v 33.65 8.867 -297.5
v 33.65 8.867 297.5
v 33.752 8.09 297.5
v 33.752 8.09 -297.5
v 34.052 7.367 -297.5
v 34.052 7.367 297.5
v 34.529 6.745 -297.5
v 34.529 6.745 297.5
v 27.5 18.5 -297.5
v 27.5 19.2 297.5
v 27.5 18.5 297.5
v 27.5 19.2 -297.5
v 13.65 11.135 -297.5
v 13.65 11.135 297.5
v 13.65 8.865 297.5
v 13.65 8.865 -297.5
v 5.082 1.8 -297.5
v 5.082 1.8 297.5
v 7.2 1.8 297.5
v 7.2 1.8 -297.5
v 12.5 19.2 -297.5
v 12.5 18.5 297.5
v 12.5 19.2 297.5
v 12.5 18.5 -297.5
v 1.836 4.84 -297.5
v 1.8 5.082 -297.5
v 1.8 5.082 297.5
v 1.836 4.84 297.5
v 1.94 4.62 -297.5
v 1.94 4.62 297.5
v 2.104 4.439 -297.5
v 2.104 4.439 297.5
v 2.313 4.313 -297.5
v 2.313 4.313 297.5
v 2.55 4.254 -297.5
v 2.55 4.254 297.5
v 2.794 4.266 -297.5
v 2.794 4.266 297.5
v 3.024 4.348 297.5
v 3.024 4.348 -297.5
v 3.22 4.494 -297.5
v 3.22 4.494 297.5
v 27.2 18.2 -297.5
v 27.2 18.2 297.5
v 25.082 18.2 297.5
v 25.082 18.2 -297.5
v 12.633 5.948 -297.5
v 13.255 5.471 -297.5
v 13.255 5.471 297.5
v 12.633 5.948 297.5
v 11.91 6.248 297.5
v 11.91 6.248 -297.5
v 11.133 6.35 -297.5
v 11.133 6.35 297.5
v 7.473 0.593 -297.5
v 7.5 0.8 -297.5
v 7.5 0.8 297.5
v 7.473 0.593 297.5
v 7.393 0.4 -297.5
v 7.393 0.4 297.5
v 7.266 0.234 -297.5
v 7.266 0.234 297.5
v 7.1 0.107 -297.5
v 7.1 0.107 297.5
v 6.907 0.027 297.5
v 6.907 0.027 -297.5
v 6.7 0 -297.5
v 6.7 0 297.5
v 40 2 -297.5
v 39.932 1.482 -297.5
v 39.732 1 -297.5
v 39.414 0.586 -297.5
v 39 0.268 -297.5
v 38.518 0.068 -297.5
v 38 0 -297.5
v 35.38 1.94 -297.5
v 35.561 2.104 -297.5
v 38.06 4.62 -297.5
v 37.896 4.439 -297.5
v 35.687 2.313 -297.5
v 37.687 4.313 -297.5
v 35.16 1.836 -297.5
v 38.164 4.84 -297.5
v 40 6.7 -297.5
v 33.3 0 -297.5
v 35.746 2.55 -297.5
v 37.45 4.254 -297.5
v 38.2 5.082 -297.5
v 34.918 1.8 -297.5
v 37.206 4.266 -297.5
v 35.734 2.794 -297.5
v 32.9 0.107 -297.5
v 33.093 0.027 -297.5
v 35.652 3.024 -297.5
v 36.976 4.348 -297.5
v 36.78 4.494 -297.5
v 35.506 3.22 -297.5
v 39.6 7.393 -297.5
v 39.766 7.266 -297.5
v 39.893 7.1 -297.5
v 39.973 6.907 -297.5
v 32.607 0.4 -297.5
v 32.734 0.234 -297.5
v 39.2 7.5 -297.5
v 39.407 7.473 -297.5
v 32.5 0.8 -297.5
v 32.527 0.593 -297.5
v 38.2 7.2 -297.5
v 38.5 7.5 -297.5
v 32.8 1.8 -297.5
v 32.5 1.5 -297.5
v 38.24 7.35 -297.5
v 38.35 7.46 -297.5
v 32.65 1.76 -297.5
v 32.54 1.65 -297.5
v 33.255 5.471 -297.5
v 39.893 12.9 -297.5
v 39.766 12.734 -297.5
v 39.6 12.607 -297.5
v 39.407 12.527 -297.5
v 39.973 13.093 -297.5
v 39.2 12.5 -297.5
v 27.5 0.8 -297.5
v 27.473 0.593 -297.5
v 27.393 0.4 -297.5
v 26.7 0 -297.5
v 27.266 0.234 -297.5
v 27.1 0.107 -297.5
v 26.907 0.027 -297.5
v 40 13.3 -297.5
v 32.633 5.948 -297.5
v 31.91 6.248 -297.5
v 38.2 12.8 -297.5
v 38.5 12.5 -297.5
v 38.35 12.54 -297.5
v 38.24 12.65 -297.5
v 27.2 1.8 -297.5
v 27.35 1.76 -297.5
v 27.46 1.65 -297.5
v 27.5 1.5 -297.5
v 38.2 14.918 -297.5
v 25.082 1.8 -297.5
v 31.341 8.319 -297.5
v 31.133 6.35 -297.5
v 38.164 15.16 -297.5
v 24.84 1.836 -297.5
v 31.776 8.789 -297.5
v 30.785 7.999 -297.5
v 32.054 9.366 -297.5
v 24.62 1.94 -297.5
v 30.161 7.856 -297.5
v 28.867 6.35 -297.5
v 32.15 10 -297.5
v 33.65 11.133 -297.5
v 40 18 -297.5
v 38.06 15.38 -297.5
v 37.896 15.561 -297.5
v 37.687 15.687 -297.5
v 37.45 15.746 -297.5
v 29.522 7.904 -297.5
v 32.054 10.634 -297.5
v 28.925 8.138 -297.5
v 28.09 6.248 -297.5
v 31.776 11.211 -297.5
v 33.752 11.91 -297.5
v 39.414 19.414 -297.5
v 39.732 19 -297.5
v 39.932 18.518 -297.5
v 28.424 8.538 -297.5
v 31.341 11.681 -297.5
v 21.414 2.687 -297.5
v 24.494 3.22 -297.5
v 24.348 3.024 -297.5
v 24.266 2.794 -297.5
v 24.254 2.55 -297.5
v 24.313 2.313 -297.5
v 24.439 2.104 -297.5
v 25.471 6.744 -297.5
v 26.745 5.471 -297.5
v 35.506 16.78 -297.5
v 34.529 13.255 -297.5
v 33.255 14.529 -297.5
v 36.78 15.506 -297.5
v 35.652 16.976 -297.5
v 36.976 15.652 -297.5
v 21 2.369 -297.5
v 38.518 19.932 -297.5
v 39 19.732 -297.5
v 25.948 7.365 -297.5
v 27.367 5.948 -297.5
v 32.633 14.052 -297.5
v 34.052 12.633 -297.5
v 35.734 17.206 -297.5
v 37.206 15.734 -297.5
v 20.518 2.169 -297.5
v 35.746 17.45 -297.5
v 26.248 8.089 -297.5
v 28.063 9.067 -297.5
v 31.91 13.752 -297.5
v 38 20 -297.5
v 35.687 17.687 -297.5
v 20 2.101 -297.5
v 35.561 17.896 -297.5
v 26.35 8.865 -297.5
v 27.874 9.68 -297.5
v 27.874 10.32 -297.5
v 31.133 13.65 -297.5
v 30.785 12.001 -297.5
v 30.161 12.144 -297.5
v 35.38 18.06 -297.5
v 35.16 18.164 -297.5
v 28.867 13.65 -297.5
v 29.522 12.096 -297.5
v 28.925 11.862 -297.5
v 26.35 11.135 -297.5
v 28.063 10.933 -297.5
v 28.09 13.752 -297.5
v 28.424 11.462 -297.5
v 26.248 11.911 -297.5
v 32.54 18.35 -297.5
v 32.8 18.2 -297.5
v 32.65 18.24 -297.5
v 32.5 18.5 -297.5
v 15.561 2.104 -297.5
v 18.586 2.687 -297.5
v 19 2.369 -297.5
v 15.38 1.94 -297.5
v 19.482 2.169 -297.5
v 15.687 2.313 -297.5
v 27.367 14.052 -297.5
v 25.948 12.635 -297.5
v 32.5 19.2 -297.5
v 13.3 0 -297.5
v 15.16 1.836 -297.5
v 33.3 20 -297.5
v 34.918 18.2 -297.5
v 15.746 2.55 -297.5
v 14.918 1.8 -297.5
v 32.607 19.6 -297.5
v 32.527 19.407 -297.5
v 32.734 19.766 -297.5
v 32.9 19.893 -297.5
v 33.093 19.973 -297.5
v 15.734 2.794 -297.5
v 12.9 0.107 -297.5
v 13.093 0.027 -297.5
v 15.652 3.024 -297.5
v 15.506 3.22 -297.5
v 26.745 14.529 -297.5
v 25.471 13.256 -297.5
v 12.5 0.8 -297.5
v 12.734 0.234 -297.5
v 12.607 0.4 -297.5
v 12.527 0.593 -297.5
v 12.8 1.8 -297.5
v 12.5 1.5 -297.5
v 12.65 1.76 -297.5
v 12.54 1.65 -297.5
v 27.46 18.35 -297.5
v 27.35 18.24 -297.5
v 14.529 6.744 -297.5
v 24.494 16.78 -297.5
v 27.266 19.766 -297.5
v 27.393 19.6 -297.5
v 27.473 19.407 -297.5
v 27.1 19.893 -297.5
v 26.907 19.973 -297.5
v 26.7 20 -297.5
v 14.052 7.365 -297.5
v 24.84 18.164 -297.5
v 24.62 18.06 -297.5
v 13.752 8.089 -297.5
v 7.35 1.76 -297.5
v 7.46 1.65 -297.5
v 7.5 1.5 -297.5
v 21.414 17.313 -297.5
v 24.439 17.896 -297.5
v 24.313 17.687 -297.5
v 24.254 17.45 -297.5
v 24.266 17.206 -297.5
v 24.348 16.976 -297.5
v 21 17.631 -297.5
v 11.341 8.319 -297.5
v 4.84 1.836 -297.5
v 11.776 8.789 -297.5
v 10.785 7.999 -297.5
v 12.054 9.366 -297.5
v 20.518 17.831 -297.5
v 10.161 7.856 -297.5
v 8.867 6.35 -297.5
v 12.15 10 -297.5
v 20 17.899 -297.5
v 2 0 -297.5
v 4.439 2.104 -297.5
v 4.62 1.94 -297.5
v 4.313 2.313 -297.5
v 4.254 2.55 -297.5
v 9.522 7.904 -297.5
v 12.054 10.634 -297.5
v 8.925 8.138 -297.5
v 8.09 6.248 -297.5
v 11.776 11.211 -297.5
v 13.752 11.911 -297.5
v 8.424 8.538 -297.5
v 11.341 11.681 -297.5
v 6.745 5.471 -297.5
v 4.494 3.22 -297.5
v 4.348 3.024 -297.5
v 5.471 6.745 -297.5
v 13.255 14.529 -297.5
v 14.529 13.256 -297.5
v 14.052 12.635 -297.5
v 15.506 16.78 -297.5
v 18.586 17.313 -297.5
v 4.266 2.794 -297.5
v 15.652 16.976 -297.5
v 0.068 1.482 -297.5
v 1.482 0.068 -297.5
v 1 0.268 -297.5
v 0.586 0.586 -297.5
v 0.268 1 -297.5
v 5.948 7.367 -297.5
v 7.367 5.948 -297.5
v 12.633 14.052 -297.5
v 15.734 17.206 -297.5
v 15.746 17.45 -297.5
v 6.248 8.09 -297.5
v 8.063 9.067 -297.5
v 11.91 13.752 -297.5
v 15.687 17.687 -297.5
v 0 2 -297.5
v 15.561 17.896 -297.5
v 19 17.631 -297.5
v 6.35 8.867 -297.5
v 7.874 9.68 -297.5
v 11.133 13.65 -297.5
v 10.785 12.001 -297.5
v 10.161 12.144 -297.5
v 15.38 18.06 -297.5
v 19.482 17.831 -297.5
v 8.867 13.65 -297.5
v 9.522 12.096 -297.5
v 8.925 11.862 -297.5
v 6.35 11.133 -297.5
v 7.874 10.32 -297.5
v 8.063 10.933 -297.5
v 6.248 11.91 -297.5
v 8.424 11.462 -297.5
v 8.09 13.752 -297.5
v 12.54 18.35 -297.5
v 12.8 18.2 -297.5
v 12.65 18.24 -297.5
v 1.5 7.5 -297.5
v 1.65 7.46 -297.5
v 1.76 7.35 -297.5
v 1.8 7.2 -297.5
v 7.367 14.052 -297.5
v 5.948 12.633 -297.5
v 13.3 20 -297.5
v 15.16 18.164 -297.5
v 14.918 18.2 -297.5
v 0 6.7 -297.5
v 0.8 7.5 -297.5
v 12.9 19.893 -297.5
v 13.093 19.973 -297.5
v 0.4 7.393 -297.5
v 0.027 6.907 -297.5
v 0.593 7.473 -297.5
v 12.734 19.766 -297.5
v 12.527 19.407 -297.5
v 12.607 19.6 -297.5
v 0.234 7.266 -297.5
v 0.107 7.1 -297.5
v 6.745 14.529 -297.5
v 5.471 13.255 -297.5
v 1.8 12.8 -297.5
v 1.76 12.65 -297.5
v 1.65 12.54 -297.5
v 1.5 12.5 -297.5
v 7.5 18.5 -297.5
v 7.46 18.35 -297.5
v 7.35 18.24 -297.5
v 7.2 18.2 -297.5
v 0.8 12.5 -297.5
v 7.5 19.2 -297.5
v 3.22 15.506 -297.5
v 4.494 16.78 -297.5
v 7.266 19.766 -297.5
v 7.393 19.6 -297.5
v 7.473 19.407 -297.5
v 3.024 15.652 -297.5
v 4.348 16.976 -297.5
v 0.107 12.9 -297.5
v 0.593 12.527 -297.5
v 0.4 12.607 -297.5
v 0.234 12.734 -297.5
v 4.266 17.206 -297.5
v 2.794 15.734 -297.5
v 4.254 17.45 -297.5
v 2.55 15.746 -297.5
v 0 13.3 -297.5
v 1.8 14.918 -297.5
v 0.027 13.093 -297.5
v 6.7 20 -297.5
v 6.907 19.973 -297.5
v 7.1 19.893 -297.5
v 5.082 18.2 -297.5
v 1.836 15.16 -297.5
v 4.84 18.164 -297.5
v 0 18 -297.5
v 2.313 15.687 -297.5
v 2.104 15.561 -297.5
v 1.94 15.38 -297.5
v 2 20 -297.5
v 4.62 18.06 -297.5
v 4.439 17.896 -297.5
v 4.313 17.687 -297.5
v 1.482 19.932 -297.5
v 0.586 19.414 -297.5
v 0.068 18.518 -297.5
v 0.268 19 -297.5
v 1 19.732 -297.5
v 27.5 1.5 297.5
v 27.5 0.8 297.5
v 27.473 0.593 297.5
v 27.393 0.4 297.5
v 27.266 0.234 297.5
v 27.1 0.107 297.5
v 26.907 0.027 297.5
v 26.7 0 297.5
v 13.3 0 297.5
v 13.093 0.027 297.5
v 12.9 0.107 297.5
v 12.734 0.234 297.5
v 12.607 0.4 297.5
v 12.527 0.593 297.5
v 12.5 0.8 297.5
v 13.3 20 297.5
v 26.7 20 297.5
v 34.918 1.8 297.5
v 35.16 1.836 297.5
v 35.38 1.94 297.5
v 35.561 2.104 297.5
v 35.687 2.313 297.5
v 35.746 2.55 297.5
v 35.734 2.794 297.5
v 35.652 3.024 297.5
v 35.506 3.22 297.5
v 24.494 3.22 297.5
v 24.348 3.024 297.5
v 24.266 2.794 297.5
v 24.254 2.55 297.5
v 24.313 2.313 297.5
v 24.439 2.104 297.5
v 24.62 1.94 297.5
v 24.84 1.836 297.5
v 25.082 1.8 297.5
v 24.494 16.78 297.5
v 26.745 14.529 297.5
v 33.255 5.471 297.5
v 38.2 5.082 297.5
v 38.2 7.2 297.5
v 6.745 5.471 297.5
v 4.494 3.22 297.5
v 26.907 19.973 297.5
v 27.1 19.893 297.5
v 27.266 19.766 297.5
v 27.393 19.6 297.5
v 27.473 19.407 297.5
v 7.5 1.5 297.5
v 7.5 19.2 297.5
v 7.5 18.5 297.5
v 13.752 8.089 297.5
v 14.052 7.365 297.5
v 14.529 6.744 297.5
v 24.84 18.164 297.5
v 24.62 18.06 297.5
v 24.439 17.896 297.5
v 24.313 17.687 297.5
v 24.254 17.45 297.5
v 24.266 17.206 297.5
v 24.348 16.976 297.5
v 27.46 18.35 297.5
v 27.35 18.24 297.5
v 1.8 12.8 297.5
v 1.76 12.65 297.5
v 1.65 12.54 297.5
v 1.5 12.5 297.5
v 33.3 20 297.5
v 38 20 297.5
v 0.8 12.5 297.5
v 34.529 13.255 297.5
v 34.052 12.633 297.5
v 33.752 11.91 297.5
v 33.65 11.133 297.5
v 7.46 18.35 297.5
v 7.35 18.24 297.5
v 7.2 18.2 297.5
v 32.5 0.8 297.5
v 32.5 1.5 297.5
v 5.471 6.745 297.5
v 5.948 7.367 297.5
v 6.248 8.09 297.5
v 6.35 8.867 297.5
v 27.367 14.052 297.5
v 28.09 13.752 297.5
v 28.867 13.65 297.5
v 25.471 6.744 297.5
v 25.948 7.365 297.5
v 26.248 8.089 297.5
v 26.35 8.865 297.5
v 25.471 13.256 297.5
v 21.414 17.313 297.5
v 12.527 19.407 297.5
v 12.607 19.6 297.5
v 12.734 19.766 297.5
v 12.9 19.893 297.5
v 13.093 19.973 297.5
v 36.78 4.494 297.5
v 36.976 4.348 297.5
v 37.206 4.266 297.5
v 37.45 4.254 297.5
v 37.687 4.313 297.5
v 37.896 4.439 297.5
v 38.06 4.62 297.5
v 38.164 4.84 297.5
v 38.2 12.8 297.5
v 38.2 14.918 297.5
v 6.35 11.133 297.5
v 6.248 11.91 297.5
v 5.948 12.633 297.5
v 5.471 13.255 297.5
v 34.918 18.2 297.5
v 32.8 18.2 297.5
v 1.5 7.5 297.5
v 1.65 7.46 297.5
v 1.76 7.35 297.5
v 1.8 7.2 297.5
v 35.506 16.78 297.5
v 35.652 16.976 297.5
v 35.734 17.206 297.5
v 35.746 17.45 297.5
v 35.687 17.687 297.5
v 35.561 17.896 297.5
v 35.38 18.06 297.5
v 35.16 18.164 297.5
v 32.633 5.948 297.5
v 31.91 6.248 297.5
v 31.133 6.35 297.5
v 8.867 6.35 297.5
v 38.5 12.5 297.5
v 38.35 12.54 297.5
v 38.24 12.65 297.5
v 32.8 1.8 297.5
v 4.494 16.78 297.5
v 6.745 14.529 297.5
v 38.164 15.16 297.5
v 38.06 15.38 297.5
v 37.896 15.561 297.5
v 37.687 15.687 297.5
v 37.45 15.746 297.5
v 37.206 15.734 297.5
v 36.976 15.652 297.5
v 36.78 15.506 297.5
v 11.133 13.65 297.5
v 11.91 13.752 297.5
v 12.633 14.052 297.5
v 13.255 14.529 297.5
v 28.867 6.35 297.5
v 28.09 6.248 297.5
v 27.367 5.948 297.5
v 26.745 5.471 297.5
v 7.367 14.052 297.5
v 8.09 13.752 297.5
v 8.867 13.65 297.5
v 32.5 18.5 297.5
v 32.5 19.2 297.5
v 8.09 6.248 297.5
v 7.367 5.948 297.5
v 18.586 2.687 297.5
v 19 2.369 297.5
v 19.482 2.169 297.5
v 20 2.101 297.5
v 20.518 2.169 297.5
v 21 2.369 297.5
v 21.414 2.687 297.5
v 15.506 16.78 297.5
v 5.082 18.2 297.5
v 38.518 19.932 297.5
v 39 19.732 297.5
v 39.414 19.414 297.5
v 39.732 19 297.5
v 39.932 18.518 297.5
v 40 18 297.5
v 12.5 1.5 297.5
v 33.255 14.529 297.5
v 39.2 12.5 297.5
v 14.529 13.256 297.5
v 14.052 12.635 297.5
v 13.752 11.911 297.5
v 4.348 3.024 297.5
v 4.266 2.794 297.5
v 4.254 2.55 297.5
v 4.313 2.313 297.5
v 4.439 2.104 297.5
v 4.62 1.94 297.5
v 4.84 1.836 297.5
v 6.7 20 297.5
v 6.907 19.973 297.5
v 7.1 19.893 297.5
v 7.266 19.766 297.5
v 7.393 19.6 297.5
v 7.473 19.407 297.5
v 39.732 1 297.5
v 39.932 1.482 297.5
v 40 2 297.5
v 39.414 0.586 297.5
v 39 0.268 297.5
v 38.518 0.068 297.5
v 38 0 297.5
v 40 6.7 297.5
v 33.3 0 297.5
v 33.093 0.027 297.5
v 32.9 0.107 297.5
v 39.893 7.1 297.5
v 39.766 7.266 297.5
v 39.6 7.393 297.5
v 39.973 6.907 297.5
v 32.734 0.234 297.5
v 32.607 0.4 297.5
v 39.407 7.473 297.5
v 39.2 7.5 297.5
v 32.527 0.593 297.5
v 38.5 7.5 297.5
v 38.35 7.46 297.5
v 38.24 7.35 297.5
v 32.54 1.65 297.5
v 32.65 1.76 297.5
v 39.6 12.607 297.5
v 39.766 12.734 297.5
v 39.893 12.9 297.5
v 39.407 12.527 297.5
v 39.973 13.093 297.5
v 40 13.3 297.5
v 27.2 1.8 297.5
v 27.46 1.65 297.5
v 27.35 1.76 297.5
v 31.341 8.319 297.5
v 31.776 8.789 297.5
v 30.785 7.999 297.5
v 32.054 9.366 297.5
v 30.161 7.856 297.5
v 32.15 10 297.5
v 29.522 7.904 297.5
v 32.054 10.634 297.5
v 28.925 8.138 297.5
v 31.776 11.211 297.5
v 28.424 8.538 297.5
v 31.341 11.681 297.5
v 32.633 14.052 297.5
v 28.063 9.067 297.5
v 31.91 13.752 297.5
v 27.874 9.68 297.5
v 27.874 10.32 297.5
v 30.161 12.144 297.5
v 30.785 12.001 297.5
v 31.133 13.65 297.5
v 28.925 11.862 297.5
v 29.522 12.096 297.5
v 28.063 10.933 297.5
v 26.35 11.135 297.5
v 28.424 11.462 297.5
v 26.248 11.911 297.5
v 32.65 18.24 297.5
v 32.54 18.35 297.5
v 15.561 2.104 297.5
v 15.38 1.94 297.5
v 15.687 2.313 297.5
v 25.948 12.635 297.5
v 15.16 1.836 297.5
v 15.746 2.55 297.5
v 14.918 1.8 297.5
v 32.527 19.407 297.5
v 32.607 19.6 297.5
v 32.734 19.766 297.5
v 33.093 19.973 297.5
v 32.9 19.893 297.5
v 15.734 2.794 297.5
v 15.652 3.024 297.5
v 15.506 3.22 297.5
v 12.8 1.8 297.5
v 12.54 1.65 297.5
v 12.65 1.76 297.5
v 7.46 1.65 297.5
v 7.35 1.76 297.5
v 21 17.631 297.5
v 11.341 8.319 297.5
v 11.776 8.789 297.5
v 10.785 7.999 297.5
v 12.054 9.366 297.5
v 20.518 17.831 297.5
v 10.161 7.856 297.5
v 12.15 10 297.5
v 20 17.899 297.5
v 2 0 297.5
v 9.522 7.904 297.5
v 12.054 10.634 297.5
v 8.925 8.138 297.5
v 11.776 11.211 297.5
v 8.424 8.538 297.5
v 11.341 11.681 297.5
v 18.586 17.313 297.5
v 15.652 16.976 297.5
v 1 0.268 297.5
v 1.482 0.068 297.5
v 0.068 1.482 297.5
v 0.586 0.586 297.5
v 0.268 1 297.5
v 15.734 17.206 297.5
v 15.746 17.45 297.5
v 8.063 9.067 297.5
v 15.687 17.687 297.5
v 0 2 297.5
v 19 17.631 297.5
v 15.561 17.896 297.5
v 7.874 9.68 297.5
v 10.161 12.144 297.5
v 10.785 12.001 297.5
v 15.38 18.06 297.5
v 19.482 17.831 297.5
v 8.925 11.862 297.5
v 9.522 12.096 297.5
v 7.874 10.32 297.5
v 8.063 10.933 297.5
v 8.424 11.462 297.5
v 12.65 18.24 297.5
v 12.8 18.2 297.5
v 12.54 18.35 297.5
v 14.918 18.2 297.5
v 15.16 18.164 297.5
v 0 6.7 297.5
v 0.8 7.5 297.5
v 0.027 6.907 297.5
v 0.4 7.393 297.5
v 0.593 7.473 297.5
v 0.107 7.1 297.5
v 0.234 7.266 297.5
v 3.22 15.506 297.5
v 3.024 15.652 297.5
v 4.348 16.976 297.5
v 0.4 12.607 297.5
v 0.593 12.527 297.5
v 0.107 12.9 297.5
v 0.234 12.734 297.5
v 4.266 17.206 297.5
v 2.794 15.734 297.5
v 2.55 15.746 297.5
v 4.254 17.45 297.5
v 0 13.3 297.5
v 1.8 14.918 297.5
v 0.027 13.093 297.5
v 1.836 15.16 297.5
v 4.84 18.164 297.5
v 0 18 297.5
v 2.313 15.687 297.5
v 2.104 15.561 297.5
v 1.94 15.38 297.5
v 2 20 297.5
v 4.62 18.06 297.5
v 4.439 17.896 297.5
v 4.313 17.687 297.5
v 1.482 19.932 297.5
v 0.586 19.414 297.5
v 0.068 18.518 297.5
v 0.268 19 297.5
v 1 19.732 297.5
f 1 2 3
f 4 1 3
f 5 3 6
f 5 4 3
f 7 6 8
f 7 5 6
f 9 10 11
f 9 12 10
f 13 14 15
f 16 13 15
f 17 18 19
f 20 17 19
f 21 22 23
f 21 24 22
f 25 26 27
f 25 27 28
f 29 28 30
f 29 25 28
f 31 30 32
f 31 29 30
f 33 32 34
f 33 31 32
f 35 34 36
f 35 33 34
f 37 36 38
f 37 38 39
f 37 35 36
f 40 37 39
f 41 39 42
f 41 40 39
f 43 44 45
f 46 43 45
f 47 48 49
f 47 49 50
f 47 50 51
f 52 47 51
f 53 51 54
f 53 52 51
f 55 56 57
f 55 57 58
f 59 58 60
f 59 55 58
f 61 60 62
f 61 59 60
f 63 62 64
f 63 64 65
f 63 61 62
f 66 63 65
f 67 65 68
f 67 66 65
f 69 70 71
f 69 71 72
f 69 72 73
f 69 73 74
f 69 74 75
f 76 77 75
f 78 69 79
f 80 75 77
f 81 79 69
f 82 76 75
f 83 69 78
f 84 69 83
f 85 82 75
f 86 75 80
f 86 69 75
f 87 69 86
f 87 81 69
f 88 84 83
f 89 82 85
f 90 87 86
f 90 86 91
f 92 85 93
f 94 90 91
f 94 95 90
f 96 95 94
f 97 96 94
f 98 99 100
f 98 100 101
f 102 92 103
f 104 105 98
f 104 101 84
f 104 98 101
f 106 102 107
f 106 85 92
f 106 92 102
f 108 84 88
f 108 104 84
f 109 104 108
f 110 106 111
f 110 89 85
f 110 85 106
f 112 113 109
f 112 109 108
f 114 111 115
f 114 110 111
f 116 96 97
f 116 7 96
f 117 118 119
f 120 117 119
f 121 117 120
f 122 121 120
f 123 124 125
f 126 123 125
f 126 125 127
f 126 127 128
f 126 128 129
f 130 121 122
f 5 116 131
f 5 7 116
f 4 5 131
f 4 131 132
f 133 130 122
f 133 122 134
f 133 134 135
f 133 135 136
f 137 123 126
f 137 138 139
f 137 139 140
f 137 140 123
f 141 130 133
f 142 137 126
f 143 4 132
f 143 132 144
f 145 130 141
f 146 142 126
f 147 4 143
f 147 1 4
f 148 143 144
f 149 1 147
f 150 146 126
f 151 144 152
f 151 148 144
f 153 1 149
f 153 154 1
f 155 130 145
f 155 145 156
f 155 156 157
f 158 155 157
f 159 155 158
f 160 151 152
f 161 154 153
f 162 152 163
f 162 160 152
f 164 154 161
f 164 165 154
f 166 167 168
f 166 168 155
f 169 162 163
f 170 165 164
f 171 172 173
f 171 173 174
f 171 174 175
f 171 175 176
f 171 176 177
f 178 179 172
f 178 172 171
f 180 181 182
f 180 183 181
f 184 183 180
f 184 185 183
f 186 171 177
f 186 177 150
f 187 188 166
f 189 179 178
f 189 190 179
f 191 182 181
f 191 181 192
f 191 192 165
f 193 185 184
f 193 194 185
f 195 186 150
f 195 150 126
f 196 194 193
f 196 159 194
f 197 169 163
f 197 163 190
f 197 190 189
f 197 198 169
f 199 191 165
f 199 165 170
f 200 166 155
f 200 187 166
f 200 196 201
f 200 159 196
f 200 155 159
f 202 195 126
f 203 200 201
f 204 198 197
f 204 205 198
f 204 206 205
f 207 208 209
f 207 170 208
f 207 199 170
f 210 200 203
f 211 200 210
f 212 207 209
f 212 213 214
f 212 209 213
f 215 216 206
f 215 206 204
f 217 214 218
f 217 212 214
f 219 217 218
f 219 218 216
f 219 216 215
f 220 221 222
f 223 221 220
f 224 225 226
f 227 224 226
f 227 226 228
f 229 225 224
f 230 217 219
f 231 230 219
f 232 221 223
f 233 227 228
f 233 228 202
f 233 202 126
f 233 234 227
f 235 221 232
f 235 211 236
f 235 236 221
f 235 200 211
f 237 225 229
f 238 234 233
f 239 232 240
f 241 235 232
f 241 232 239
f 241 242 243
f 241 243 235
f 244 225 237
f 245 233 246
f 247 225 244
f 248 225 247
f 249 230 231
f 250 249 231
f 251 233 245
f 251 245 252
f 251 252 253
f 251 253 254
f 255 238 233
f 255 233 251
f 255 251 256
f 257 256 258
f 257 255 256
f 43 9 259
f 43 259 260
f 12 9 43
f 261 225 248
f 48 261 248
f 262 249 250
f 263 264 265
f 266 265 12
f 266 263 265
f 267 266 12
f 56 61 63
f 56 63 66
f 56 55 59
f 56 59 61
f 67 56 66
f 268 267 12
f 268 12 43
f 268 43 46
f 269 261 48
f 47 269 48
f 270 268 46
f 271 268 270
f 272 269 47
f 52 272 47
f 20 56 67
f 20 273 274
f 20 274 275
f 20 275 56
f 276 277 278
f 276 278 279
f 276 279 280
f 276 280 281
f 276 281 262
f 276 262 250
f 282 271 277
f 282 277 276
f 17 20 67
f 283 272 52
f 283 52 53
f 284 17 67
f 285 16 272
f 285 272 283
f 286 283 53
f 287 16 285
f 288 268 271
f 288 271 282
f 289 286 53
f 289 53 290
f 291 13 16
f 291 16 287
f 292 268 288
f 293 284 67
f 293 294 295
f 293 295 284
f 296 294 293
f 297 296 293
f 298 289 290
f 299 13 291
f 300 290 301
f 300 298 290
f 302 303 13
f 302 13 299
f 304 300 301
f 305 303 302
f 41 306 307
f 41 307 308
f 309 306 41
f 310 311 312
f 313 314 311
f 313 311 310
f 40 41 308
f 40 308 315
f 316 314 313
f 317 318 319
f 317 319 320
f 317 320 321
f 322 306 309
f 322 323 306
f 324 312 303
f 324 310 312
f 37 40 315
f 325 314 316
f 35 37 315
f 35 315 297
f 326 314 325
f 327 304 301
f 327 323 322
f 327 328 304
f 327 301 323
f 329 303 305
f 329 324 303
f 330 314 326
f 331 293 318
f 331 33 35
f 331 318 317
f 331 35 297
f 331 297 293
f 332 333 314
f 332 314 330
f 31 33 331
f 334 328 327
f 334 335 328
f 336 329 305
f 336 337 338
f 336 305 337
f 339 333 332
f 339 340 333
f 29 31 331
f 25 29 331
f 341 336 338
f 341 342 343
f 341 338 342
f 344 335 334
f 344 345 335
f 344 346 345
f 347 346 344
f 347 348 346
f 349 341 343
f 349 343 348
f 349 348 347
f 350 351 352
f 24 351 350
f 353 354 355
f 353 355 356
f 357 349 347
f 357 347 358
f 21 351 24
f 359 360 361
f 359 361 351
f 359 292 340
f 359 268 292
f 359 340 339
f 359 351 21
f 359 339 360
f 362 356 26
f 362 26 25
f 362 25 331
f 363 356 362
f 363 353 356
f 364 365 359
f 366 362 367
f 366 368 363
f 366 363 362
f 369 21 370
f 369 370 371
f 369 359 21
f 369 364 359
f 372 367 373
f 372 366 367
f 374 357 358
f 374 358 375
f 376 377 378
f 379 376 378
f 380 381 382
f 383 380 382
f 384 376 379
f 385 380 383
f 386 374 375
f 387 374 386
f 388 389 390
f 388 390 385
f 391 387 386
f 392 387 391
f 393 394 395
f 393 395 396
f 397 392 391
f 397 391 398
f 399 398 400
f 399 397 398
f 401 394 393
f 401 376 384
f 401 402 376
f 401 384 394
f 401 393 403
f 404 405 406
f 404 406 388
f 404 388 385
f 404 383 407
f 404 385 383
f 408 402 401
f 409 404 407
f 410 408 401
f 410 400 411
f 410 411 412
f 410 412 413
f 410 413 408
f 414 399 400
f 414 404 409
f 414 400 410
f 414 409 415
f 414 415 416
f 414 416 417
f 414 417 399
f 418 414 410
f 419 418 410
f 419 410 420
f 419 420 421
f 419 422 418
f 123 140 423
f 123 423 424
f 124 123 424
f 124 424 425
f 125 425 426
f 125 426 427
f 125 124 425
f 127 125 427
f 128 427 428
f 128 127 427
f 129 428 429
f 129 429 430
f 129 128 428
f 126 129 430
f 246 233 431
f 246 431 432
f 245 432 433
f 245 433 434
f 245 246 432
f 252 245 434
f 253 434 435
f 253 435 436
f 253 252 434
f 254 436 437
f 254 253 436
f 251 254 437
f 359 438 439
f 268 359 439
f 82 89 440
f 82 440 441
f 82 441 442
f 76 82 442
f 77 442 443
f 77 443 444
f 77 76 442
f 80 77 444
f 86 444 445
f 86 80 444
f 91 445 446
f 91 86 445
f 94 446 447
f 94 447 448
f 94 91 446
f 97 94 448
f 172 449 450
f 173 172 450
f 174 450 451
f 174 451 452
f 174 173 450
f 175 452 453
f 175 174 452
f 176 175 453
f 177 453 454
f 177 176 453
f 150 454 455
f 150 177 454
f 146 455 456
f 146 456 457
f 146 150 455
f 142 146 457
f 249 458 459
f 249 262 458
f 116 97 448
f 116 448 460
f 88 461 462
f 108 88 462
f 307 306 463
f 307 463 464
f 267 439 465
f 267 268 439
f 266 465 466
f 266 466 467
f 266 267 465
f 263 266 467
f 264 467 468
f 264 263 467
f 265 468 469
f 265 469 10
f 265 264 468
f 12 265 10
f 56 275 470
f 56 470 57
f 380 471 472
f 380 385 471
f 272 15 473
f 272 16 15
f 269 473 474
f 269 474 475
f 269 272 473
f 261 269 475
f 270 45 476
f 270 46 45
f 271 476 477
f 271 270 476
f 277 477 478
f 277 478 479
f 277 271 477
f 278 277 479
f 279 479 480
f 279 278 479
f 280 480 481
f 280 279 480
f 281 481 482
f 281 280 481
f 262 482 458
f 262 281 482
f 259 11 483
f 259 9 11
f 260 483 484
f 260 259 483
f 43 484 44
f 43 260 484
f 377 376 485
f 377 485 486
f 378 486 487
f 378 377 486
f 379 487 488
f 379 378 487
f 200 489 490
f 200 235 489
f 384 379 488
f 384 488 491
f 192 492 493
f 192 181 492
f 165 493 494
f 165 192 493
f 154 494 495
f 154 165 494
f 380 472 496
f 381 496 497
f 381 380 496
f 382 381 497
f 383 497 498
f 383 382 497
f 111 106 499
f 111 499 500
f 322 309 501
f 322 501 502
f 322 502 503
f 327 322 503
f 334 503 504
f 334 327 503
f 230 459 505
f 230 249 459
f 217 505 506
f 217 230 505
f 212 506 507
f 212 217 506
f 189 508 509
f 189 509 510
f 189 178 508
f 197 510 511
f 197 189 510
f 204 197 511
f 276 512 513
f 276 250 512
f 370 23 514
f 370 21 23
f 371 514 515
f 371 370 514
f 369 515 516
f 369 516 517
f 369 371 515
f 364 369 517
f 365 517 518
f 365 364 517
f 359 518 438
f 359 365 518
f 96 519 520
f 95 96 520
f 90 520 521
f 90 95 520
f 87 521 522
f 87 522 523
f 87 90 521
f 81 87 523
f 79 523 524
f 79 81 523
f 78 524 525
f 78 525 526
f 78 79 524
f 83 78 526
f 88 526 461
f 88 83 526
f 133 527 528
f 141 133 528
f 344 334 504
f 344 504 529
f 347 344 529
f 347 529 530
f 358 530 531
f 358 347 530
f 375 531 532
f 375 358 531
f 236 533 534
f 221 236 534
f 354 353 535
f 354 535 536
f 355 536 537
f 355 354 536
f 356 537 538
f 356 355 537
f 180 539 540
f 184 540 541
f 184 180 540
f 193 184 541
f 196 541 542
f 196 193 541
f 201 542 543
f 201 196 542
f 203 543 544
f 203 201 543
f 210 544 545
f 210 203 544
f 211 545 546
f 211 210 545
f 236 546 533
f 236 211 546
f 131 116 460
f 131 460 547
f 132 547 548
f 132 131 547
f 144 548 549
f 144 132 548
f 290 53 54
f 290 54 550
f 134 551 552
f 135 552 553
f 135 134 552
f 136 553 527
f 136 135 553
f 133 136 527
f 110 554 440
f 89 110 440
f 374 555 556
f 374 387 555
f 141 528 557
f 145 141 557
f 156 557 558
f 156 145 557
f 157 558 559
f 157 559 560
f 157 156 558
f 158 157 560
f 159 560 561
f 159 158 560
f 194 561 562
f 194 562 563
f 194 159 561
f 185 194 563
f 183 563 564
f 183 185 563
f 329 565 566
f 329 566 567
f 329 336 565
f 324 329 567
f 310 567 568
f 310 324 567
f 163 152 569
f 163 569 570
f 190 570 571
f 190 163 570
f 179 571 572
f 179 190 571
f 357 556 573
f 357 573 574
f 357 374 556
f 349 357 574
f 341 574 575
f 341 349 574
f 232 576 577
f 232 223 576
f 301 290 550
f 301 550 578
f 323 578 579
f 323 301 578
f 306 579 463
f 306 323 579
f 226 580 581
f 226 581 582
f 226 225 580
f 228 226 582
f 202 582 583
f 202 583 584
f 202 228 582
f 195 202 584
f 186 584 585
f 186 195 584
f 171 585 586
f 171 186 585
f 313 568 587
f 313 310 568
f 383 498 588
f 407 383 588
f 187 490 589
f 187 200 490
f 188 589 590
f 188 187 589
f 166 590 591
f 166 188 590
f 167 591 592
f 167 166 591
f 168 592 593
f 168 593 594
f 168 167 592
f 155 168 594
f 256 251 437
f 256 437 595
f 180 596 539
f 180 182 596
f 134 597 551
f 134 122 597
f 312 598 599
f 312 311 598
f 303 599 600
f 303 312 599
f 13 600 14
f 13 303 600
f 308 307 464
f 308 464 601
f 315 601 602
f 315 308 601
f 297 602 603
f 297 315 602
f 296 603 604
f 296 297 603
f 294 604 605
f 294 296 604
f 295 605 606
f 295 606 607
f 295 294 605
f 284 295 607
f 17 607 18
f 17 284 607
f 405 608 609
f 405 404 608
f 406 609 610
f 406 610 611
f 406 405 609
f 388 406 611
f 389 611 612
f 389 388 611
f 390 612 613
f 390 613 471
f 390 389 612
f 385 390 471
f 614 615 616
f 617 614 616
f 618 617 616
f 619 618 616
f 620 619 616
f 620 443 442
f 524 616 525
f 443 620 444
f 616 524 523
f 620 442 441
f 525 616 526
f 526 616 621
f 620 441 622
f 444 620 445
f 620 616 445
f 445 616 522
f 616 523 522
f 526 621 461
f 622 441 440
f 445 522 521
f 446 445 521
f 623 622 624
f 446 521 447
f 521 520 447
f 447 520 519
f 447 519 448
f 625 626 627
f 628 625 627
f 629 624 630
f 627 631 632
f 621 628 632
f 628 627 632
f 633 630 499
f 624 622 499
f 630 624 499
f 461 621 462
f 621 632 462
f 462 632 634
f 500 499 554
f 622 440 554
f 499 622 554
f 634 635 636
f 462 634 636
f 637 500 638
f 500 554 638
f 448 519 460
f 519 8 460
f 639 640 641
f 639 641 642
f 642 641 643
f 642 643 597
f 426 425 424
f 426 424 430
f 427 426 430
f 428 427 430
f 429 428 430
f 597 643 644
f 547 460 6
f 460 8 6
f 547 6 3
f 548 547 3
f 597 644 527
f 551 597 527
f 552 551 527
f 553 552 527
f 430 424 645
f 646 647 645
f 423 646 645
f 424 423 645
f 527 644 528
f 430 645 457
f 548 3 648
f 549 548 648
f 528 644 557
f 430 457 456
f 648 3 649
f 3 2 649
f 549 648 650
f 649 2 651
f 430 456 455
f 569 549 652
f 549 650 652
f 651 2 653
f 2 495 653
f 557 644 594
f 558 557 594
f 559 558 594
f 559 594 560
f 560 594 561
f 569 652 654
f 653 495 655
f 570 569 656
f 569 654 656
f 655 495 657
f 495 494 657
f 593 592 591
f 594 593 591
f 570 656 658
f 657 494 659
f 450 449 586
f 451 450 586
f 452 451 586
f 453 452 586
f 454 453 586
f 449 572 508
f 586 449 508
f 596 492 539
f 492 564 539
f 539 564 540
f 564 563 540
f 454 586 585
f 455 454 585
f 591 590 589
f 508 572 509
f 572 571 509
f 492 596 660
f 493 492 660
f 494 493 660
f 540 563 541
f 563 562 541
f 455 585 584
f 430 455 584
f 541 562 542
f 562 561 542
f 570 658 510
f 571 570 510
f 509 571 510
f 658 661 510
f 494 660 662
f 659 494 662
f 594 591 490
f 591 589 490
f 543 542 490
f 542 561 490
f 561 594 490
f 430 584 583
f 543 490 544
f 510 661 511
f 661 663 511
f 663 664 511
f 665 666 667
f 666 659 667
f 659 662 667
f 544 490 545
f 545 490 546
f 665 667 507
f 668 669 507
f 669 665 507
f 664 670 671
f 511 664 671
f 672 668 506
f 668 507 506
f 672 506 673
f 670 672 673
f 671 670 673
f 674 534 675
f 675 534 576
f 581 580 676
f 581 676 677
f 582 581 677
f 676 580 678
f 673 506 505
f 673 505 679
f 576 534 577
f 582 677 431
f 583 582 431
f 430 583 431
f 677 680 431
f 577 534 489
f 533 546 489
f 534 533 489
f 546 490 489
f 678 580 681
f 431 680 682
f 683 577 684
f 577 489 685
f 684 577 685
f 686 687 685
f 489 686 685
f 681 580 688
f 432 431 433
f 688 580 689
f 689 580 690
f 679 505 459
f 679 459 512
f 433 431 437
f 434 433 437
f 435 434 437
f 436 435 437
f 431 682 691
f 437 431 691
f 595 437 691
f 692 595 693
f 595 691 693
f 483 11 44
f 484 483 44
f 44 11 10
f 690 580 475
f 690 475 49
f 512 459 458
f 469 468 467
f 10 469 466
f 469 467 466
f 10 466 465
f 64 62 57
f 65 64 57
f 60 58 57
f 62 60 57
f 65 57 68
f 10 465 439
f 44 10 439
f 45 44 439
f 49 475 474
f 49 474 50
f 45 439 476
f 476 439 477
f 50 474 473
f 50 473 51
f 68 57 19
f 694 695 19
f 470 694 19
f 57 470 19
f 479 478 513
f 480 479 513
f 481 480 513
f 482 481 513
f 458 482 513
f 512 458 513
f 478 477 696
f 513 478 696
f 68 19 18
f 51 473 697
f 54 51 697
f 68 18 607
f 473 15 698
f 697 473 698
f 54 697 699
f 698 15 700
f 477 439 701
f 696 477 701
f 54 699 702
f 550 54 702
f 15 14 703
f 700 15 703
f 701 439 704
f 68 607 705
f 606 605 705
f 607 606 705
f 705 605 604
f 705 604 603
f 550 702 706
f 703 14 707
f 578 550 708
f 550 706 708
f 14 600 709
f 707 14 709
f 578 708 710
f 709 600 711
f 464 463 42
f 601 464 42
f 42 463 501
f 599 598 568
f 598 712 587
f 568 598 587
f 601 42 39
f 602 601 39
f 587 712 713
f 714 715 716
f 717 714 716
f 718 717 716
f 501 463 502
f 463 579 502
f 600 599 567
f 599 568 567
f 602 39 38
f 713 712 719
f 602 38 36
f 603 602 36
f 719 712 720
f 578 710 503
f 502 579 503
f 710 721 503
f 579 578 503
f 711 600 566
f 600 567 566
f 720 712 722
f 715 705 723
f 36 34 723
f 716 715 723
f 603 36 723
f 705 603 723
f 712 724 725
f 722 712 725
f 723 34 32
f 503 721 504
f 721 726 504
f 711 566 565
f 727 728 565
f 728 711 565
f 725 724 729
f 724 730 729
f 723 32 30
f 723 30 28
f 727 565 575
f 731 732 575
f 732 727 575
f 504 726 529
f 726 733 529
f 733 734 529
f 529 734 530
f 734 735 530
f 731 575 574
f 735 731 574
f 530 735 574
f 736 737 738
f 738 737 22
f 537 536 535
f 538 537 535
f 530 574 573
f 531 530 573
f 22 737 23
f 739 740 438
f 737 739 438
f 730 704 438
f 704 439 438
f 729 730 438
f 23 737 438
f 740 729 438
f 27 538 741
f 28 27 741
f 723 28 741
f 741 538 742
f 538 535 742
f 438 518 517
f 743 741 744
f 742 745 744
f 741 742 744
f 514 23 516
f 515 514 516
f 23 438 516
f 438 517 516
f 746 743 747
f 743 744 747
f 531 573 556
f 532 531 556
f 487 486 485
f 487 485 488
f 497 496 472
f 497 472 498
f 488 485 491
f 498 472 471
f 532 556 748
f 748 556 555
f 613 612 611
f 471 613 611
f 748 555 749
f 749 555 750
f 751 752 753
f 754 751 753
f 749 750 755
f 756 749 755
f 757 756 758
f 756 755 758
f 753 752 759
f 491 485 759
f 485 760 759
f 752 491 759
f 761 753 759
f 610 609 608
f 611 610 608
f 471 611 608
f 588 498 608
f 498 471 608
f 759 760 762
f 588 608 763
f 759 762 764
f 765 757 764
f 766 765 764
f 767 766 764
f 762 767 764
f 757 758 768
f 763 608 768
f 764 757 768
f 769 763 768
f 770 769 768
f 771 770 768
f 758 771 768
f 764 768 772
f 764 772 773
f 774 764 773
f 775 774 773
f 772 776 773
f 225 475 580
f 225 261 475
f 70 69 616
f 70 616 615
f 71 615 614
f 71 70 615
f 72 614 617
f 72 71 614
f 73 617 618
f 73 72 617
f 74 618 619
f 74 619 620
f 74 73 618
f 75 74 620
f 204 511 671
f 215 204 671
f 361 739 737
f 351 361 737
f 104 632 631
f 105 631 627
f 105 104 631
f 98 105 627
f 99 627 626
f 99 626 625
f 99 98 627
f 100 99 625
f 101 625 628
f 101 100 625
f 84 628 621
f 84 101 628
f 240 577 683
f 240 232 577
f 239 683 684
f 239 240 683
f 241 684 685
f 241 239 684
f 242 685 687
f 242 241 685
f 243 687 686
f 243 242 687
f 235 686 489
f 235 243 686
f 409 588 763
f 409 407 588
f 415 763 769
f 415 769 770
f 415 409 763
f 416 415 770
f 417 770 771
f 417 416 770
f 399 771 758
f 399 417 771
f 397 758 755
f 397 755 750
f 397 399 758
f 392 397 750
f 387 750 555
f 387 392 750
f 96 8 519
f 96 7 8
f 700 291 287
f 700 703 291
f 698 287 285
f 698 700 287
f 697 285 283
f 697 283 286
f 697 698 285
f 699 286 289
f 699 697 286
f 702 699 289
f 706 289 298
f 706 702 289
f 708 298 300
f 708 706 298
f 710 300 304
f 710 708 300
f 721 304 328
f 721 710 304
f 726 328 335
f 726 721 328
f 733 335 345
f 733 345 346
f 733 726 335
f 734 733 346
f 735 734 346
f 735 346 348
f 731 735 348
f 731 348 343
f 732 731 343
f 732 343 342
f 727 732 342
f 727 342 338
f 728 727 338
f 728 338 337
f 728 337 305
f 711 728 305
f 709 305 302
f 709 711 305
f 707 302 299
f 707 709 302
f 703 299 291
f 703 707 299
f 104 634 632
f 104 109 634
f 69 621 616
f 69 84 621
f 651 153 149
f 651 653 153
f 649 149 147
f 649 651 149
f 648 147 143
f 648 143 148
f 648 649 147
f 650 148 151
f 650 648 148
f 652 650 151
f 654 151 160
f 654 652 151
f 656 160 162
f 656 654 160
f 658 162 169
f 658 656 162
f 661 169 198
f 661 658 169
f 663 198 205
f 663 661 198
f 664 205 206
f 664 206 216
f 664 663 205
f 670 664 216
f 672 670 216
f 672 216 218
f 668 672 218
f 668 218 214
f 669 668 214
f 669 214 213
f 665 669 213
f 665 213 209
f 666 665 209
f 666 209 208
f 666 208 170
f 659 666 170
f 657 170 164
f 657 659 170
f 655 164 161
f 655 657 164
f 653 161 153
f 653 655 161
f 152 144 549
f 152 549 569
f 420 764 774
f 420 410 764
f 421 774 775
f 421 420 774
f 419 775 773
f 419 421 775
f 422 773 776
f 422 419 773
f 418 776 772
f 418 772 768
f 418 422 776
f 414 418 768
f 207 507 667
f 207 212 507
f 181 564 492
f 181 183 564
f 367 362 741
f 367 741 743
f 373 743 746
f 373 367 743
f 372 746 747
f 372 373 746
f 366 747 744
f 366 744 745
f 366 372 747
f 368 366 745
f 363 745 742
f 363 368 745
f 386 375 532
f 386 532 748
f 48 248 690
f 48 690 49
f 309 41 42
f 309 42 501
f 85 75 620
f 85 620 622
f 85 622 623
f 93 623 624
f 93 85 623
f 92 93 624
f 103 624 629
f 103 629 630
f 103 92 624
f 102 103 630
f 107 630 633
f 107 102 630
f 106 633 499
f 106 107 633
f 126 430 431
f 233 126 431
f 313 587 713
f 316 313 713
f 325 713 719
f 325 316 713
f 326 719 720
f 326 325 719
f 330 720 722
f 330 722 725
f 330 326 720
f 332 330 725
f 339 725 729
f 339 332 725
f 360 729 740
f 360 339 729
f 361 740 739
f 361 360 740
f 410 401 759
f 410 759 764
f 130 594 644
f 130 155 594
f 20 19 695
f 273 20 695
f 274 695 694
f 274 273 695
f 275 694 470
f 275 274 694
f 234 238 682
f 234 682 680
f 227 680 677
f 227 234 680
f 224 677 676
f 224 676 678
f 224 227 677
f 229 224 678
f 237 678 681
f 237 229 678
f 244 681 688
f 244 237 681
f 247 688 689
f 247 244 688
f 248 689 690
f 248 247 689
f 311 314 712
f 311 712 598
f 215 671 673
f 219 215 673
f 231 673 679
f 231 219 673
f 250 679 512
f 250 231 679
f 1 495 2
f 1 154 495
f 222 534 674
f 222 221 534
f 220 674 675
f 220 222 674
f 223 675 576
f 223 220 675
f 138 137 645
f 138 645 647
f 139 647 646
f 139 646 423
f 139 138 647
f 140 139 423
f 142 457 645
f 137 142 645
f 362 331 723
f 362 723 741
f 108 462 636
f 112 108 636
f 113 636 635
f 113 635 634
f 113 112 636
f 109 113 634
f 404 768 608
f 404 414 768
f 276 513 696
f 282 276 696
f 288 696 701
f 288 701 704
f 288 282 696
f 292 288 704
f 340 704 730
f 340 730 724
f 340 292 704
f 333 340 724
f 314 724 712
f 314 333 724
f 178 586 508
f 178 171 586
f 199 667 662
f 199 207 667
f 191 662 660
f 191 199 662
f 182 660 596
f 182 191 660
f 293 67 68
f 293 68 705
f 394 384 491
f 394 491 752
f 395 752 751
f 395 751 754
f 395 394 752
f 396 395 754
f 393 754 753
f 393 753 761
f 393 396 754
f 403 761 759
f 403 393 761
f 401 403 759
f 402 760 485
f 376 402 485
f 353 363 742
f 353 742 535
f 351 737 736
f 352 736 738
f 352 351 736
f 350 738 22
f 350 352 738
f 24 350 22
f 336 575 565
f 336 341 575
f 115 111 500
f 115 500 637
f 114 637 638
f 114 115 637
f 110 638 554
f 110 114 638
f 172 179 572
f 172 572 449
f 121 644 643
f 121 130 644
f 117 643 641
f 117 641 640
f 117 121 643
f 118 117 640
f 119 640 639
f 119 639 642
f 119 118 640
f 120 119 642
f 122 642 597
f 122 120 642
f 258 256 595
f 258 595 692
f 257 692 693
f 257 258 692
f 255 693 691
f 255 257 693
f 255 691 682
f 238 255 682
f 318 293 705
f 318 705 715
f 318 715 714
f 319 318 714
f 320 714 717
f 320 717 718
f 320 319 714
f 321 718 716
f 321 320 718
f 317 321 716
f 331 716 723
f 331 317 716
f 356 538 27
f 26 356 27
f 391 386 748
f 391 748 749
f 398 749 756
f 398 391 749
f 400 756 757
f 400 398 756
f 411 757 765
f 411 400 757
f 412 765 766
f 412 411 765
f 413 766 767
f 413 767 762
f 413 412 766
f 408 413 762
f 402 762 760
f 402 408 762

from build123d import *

# Parameters (mm, degrees)
ESQUISSE1_R        = 2.15
BOSS_EXTRU_1_DEPTH = 297.5


with BuildPart() as part:
    # Esquisse1 → Boss.-Extru.1 (new, symmetric)
    with BuildSketch(Plane(origin=(0, 0, 0), x_dir=(-1, 0, 0), z_dir=(0, 0, -1))):
        with BuildLine():
            Line((-40, 6.7), (-40, 2))
            ThreePointArc((-40, 2), (-39.414213562, 0.585786438), (-38, 0))
            Line((-38, 0), (-33.3, 0))
            ThreePointArc((-33.3, 0), (-32.734314575, 0.234314575), (-32.5, 0.8))
            Line((-32.5, 0.8), (-32.5, 1.5))
            ThreePointArc((-32.5, 1.5), (-32.587867966, 1.712132034), (-32.8, 1.8))
            Line((-32.8, 1.8), (-34.918424061, 1.8))
            ThreePointArc((-34.918424061, 1.8), (-35.686700051, 2.313345604), (-35.506437047, 3.219588924))
            Line((-35.506437047, 3.219588924), (-33.254705627, 5.471320344))
            ThreePointArc((-33.254705627, 5.471320344), (-32.281435581, 6.121638598), (-31.133385284, 6.35))
            Line((-31.133385284, 6.35), (-28.866614716, 6.35))
            ThreePointArc((-28.866614716, 6.35), (-27.718564419, 6.121638598), (-26.745294373, 5.471320344))
            Line((-26.745294373, 5.471320344), (-24.493562953, 3.219588924))
            ThreePointArc((-24.493562953, 3.219588924), (-24.313299949, 2.313345604), (-25.081575939, 1.8))
            Line((-25.081575939, 1.8), (-27.2, 1.8))
            ThreePointArc((-27.2, 1.8), (-27.412132034, 1.712132034), (-27.5, 1.5))
            Line((-27.5, 1.5), (-27.5, 0.8))
            ThreePointArc((-27.5, 0.8), (-27.265685425, 0.234314575), (-26.7, 0))
            Line((-26.7, 0), (-13.3, 0))
            ThreePointArc((-13.3, 0), (-12.734314575, 0.234314575), (-12.5, 0.8))
            Line((-12.5, 0.8), (-12.5, 1.5))
            ThreePointArc((-12.5, 1.5), (-12.587867966, 1.712132034), (-12.8, 1.8))
            Line((-12.8, 1.8), (-14.918424061, 1.8))
            ThreePointArc((-14.918424061, 1.8), (-15.686700051, 2.313345604), (-15.506437047, 3.219588924))
            Line((-15.506437047, 3.219588924), (-13.254705627, 5.471320344))
            ThreePointArc((-13.254705627, 5.471320344), (-12.281435581, 6.121638598), (-11.133385284, 6.35))
            Line((-11.133385284, 6.35), (-8.866614716, 6.35))
            ThreePointArc((-8.866614716, 6.35), (-7.718564419, 6.121638598), (-6.745294373, 5.471320344))
            Line((-6.745294373, 5.471320344), (-4.493562953, 3.219588924))
            ThreePointArc((-4.493562953, 3.219588924), (-4.313299949, 2.313345604), (-5.081575939, 1.8))
            Line((-5.081575939, 1.8), (-7.2, 1.8))
            ThreePointArc((-7.2, 1.8), (-7.412132034, 1.712132034), (-7.5, 1.5))
            Line((-7.5, 1.5), (-7.5, 0.8))
            ThreePointArc((-7.5, 0.8), (-7.265685425, 0.234314575), (-6.7, 0))
            Line((-6.7, 0), (-2, 0))
            ThreePointArc((-2, 0), (-0.585786438, 0.585786438), (0, 2))
            Line((0, 2), (0, 6.7))
            ThreePointArc((0, 6.7), (-0.234314575, 7.265685425), (-0.8, 7.5))
            Line((-0.8, 7.5), (-1.5, 7.5))
            ThreePointArc((-1.5, 7.5), (-1.712132034, 7.412132034), (-1.8, 7.2))
            Line((-1.8, 7.2), (-1.8, 5.081575939))
            ThreePointArc((-1.8, 5.081575939), (-2.313345604, 4.313299949), (-3.219588924, 4.493562953))
            Line((-3.219588924, 4.493562953), (-5.471320344, 6.745294373))
            ThreePointArc((-5.471320344, 6.745294373), (-6.121638598, 7.718564419), (-6.35, 8.866614716))
            Line((-6.35, 8.866614716), (-6.35, 11.133385284))
            ThreePointArc((-6.35, 11.133385284), (-6.121638598, 12.281435581), (-5.471320344, 13.254705627))
            Line((-5.471320344, 13.254705627), (-3.219588924, 15.506437047))
            ThreePointArc((-3.219588924, 15.506437047), (-2.313345604, 15.686700051), (-1.8, 14.918424061))
            Line((-1.8, 14.918424061), (-1.8, 12.8))
            ThreePointArc((-1.8, 12.8), (-1.712132034, 12.587867966), (-1.5, 12.5))
            Line((-1.5, 12.5), (-0.8, 12.5))
            ThreePointArc((-0.8, 12.5), (-0.234314575, 12.734314575), (0, 13.3))
            Line((0, 13.3), (0, 18))
            ThreePointArc((0, 18), (-0.585786438, 19.414213562), (-2, 20))
            Line((-2, 20), (-6.7, 20))
            ThreePointArc((-6.7, 20), (-7.265685425, 19.765685425), (-7.5, 19.2))
            Line((-7.5, 19.2), (-7.5, 18.5))
            ThreePointArc((-7.5, 18.5), (-7.412132034, 18.287867966), (-7.2, 18.2))
            Line((-7.2, 18.2), (-5.081575939, 18.2))
            ThreePointArc((-5.081575939, 18.2), (-4.313299949, 17.686654396), (-4.493562953, 16.780411076))
            Line((-4.493562953, 16.780411076), (-6.745294373, 14.528679656))
            ThreePointArc((-6.745294373, 14.528679656), (-7.718564419, 13.878361402), (-8.866614716, 13.65))
            Line((-8.866614716, 13.65), (-11.133385284, 13.65))
            ThreePointArc((-11.133385284, 13.65), (-12.281435581, 13.878361402), (-13.254705627, 14.528679656))
            Line((-13.254705627, 14.528679656), (-15.506437047, 16.780411076))
            ThreePointArc((-15.506437047, 16.780411076), (-15.686700051, 17.686654396), (-14.918424061, 18.2))
            Line((-14.918424061, 18.2), (-12.8, 18.2))
            ThreePointArc((-12.8, 18.2), (-12.587867966, 18.287867966), (-12.5, 18.5))
            Line((-12.5, 18.5), (-12.5, 19.2))
            ThreePointArc((-12.5, 19.2), (-12.734314575, 19.765685425), (-13.3, 20))
            Line((-13.3, 20), (-26.7, 20))
            ThreePointArc((-26.7, 20), (-27.265685425, 19.765685425), (-27.5, 19.2))
            Line((-27.5, 19.2), (-27.5, 18.5))
            ThreePointArc((-27.5, 18.5), (-27.412132034, 18.287867966), (-27.2, 18.2))
            Line((-27.2, 18.2), (-25.081575939, 18.2))
            ThreePointArc((-25.081575939, 18.2), (-24.313299949, 17.686654396), (-24.493562953, 16.780411076))
            Line((-24.493562953, 16.780411076), (-26.745294373, 14.528679656))
            ThreePointArc((-26.745294373, 14.528679656), (-27.718564419, 13.878361402), (-28.866614716, 13.65))
            Line((-28.866614716, 13.65), (-31.133385284, 13.65))
            ThreePointArc((-31.133385284, 13.65), (-32.281435581, 13.878361402), (-33.254705627, 14.528679656))
            Line((-33.254705627, 14.528679656), (-35.506437047, 16.780411076))
            ThreePointArc((-35.506437047, 16.780411076), (-35.686700051, 17.686654396), (-34.918424061, 18.2))
            Line((-34.918424061, 18.2), (-32.8, 18.2))
            ThreePointArc((-32.8, 18.2), (-32.587867966, 18.287867966), (-32.5, 18.5))
            Line((-32.5, 18.5), (-32.5, 19.2))
            ThreePointArc((-32.5, 19.2), (-32.734314575, 19.765685425), (-33.3, 20))
            Line((-33.3, 20), (-38, 20))
            ThreePointArc((-38, 20), (-39.414213562, 19.414213562), (-40, 18))
            Line((-40, 18), (-40, 13.3))
            ThreePointArc((-40, 13.3), (-39.765685425, 12.734314575), (-39.2, 12.5))
            Line((-39.2, 12.5), (-38.5, 12.5))
            ThreePointArc((-38.5, 12.5), (-38.287867966, 12.587867966), (-38.2, 12.8))
            Line((-38.2, 12.8), (-38.2, 14.918424061))
            ThreePointArc((-38.2, 14.918424061), (-37.686654396, 15.686700051), (-36.780411076, 15.506437047))
            Line((-36.780411076, 15.506437047), (-34.528679656, 13.254705627))
            ThreePointArc((-34.528679656, 13.254705627), (-33.878361402, 12.281435581), (-33.65, 11.133385284))
            Line((-33.65, 11.133385284), (-33.65, 8.866614716))
            ThreePointArc((-33.65, 8.866614716), (-33.878361402, 7.718564419), (-34.528679656, 6.745294373))
            Line((-34.528679656, 6.745294373), (-36.780411076, 4.493562953))
            ThreePointArc((-36.780411076, 4.493562953), (-37.686654396, 4.313299949), (-38.2, 5.081575939))
            Line((-38.2, 5.081575939), (-38.2, 7.2))
            ThreePointArc((-38.2, 7.2), (-38.287867966, 7.412132034), (-38.5, 7.5))
            Line((-38.5, 7.5), (-39.2, 7.5))
            ThreePointArc((-39.2, 7.5), (-39.765685425, 7.265685425), (-40, 6.7))
        make_face()
        with Locations(Location((-10, 10, 0), (0, 0, 180))):
            Circle(ESQUISSE1_R, mode=Mode.SUBTRACT)
        with Locations(Location((-30, 10, 0), (0, 0, 180))):
            Circle(ESQUISSE1_R, mode=Mode.SUBTRACT)
        with BuildLine():
            Line((-18.585786174, 17.312993861), (-14.528681072, 13.255889759))
            ThreePointArc((-14.528681072, 13.255889759), (-13.878362627, 12.282619622), (-13.650001154, 11.134569154))
            Line((-13.650001154, 11.134569154), (-13.650001154, 8.865431094))
            ThreePointArc((-13.650001154, 8.865431094), (-13.878362476, 7.717381202), (-14.5286805, 6.7441115))
            Line((-14.5286805, 6.7441115), (-18.585786, 2.687006))
            ThreePointArc((-18.585786, 2.687006), (-19.999999562, 2.101219562), (-21.414213125, 2.687006))
            Line((-21.414213125, 2.687006), (-25.471320125, 6.744113))
            ThreePointArc((-25.471320125, 6.744113), (-26.121638379, 7.717383046), (-26.349999781, 8.865433344))
            Line((-26.349999781, 8.865433344), (-26.349999781, 11.134567344))
            ThreePointArc((-26.349999781, 11.134567344), (-26.121638308, 12.282617811), (-25.471319863, 13.255887949))
            Line((-25.471319863, 13.255887949), (-21.41421295, 17.312993861))
            ThreePointArc((-21.41421295, 17.312993861), (-19.999999562, 17.898780125), (-18.585786174, 17.312993861))
        make_face(mode=Mode.SUBTRACT)
    extrude(amount=BOSS_EXTRU_1_DEPTH, both=True)


solid = part.part
